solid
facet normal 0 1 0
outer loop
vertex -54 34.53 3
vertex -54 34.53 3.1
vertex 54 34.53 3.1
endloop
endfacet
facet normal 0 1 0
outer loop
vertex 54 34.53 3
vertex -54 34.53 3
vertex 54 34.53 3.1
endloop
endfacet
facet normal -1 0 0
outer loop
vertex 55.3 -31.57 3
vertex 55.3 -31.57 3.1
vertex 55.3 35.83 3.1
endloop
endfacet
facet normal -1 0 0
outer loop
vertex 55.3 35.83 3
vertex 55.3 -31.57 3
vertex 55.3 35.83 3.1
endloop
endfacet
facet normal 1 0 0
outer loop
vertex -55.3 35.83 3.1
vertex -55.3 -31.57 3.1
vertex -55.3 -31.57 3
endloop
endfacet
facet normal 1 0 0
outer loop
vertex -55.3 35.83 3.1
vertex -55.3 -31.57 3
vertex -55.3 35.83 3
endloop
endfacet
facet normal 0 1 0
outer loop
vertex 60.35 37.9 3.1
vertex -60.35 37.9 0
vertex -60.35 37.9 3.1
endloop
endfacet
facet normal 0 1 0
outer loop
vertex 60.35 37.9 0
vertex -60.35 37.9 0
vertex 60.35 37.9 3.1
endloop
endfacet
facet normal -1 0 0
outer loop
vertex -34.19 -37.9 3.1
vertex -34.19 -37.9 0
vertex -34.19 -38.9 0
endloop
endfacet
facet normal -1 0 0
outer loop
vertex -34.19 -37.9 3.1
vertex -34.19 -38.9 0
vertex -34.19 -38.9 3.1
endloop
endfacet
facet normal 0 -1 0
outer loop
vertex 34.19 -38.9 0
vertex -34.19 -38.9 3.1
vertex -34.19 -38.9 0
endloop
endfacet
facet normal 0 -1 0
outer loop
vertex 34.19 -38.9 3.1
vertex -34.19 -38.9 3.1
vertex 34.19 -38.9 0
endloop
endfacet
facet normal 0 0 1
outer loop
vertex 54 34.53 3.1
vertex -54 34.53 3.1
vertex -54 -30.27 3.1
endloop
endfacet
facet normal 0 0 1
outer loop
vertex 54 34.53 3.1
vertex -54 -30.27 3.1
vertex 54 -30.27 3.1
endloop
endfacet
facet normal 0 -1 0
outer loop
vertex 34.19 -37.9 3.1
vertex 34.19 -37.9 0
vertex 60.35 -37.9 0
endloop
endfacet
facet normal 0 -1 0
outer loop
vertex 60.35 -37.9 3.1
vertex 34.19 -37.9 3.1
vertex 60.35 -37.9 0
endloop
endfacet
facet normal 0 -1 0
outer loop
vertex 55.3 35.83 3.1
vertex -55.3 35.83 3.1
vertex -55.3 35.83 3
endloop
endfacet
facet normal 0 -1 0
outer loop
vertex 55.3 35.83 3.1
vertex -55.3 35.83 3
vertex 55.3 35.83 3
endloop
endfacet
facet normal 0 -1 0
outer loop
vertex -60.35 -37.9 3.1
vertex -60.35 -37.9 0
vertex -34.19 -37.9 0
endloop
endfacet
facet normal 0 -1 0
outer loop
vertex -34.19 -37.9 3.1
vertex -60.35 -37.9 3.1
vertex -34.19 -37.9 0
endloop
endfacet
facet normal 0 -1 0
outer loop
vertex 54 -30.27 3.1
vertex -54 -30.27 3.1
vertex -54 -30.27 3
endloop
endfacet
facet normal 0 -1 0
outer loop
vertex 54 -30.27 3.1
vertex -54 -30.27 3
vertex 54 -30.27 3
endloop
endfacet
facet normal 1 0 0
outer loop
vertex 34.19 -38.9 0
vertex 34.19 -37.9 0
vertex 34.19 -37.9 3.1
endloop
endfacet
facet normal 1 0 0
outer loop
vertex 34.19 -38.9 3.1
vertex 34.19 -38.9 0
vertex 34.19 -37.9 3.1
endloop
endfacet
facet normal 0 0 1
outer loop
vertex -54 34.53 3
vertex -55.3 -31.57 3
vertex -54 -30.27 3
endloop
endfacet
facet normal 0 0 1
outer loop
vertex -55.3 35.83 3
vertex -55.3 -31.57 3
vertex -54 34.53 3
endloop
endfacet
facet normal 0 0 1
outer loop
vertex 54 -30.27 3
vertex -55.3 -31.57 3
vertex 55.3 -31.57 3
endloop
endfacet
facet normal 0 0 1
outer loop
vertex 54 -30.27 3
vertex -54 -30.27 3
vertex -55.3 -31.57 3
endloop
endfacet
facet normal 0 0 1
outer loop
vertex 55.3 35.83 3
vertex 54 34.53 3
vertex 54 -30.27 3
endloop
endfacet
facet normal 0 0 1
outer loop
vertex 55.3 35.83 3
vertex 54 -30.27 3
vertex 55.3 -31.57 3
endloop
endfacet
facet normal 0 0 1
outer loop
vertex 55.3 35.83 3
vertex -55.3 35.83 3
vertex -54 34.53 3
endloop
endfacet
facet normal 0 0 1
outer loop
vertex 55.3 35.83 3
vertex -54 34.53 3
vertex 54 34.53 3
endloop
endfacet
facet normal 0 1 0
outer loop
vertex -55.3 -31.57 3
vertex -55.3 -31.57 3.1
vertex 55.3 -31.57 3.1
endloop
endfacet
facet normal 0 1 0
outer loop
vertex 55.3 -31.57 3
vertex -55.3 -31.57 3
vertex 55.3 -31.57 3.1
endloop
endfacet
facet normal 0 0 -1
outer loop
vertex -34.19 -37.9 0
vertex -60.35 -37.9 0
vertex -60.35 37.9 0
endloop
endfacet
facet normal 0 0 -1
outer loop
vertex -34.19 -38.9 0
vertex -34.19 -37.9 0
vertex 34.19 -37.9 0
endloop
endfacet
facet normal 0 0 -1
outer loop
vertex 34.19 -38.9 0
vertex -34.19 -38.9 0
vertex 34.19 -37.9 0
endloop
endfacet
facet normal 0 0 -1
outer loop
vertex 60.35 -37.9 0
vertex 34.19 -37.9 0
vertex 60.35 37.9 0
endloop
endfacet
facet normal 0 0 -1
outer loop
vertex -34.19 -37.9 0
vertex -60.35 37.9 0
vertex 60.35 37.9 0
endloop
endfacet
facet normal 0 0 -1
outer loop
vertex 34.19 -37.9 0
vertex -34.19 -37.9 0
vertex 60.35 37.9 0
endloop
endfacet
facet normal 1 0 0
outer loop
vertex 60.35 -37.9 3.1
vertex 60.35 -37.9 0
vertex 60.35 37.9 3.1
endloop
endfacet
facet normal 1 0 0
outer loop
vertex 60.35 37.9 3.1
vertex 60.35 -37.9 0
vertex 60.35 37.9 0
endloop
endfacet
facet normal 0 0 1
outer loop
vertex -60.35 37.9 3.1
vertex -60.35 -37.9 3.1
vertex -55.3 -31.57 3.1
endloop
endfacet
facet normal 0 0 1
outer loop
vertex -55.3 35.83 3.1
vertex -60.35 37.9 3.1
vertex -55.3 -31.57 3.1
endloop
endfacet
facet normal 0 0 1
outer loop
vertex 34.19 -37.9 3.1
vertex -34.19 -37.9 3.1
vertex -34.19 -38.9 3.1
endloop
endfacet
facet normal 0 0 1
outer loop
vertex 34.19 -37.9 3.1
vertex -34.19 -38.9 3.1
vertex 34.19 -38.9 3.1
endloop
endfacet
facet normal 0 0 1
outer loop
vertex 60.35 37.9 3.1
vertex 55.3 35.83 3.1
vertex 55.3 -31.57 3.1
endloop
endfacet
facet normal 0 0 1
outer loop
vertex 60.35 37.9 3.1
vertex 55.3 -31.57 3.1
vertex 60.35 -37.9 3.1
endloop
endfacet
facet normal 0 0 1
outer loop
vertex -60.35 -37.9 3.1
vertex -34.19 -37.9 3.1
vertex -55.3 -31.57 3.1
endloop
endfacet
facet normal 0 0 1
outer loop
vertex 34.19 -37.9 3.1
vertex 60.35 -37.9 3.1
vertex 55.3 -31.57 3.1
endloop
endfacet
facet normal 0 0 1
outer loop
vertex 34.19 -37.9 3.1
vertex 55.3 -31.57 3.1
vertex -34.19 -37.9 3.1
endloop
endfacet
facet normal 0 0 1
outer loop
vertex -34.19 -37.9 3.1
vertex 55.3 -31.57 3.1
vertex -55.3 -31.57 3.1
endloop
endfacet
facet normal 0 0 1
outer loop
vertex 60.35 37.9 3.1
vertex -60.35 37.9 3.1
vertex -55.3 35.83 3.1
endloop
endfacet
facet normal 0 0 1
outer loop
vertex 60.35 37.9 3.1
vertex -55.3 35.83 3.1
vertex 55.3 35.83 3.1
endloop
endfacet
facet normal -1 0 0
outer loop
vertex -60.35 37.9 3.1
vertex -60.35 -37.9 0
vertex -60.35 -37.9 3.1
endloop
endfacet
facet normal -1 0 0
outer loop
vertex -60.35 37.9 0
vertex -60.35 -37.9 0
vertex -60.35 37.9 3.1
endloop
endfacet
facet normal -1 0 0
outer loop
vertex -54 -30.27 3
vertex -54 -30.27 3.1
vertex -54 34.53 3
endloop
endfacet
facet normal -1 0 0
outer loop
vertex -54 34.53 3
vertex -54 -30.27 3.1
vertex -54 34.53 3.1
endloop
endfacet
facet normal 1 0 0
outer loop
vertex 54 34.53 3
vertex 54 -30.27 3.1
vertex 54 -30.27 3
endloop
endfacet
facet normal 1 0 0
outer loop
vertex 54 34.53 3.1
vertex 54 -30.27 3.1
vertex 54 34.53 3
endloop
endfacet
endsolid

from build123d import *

# Parameters (mm, degrees)
F0_W     = 120.7
F0_H     = 75.8
F1_DEPTH = 3.1
F2_W     = 110.6
F2_H     = 67.4
F2_W_2   = 108
F2_H_2   = 64.8
F3_DEPTH = 0.1
F4_W     = 68.38
F4_H     = 3.1
F5_DEPTH = 1


with BuildPart() as f1:
    # F0 (on Top) → F1 (new body)
    with BuildSketch(Plane.XY):
        Rectangle(F0_W, F0_H)
    extrude(amount=F1_DEPTH)

    # F2 (on face) → F3 (cut)
    with BuildSketch(Plane.XY.offset(3.1)):
        with Locations((0, 2.13)):
            Rectangle(F2_W, F2_H)
        with Locations((0, 2.13)):
            Rectangle(F2_W_2, F2_H_2, mode=Mode.SUBTRACT)
    extrude(amount=-F3_DEPTH, mode=Mode.SUBTRACT)

    # F4 (on face) → F5 (join)
    with BuildSketch(Plane.XZ.offset(37.9)):
        with Locations((0, 1.55)):
            Rectangle(F4_W, F4_H)
    extrude(amount=F5_DEPTH)


solid = f1.part
